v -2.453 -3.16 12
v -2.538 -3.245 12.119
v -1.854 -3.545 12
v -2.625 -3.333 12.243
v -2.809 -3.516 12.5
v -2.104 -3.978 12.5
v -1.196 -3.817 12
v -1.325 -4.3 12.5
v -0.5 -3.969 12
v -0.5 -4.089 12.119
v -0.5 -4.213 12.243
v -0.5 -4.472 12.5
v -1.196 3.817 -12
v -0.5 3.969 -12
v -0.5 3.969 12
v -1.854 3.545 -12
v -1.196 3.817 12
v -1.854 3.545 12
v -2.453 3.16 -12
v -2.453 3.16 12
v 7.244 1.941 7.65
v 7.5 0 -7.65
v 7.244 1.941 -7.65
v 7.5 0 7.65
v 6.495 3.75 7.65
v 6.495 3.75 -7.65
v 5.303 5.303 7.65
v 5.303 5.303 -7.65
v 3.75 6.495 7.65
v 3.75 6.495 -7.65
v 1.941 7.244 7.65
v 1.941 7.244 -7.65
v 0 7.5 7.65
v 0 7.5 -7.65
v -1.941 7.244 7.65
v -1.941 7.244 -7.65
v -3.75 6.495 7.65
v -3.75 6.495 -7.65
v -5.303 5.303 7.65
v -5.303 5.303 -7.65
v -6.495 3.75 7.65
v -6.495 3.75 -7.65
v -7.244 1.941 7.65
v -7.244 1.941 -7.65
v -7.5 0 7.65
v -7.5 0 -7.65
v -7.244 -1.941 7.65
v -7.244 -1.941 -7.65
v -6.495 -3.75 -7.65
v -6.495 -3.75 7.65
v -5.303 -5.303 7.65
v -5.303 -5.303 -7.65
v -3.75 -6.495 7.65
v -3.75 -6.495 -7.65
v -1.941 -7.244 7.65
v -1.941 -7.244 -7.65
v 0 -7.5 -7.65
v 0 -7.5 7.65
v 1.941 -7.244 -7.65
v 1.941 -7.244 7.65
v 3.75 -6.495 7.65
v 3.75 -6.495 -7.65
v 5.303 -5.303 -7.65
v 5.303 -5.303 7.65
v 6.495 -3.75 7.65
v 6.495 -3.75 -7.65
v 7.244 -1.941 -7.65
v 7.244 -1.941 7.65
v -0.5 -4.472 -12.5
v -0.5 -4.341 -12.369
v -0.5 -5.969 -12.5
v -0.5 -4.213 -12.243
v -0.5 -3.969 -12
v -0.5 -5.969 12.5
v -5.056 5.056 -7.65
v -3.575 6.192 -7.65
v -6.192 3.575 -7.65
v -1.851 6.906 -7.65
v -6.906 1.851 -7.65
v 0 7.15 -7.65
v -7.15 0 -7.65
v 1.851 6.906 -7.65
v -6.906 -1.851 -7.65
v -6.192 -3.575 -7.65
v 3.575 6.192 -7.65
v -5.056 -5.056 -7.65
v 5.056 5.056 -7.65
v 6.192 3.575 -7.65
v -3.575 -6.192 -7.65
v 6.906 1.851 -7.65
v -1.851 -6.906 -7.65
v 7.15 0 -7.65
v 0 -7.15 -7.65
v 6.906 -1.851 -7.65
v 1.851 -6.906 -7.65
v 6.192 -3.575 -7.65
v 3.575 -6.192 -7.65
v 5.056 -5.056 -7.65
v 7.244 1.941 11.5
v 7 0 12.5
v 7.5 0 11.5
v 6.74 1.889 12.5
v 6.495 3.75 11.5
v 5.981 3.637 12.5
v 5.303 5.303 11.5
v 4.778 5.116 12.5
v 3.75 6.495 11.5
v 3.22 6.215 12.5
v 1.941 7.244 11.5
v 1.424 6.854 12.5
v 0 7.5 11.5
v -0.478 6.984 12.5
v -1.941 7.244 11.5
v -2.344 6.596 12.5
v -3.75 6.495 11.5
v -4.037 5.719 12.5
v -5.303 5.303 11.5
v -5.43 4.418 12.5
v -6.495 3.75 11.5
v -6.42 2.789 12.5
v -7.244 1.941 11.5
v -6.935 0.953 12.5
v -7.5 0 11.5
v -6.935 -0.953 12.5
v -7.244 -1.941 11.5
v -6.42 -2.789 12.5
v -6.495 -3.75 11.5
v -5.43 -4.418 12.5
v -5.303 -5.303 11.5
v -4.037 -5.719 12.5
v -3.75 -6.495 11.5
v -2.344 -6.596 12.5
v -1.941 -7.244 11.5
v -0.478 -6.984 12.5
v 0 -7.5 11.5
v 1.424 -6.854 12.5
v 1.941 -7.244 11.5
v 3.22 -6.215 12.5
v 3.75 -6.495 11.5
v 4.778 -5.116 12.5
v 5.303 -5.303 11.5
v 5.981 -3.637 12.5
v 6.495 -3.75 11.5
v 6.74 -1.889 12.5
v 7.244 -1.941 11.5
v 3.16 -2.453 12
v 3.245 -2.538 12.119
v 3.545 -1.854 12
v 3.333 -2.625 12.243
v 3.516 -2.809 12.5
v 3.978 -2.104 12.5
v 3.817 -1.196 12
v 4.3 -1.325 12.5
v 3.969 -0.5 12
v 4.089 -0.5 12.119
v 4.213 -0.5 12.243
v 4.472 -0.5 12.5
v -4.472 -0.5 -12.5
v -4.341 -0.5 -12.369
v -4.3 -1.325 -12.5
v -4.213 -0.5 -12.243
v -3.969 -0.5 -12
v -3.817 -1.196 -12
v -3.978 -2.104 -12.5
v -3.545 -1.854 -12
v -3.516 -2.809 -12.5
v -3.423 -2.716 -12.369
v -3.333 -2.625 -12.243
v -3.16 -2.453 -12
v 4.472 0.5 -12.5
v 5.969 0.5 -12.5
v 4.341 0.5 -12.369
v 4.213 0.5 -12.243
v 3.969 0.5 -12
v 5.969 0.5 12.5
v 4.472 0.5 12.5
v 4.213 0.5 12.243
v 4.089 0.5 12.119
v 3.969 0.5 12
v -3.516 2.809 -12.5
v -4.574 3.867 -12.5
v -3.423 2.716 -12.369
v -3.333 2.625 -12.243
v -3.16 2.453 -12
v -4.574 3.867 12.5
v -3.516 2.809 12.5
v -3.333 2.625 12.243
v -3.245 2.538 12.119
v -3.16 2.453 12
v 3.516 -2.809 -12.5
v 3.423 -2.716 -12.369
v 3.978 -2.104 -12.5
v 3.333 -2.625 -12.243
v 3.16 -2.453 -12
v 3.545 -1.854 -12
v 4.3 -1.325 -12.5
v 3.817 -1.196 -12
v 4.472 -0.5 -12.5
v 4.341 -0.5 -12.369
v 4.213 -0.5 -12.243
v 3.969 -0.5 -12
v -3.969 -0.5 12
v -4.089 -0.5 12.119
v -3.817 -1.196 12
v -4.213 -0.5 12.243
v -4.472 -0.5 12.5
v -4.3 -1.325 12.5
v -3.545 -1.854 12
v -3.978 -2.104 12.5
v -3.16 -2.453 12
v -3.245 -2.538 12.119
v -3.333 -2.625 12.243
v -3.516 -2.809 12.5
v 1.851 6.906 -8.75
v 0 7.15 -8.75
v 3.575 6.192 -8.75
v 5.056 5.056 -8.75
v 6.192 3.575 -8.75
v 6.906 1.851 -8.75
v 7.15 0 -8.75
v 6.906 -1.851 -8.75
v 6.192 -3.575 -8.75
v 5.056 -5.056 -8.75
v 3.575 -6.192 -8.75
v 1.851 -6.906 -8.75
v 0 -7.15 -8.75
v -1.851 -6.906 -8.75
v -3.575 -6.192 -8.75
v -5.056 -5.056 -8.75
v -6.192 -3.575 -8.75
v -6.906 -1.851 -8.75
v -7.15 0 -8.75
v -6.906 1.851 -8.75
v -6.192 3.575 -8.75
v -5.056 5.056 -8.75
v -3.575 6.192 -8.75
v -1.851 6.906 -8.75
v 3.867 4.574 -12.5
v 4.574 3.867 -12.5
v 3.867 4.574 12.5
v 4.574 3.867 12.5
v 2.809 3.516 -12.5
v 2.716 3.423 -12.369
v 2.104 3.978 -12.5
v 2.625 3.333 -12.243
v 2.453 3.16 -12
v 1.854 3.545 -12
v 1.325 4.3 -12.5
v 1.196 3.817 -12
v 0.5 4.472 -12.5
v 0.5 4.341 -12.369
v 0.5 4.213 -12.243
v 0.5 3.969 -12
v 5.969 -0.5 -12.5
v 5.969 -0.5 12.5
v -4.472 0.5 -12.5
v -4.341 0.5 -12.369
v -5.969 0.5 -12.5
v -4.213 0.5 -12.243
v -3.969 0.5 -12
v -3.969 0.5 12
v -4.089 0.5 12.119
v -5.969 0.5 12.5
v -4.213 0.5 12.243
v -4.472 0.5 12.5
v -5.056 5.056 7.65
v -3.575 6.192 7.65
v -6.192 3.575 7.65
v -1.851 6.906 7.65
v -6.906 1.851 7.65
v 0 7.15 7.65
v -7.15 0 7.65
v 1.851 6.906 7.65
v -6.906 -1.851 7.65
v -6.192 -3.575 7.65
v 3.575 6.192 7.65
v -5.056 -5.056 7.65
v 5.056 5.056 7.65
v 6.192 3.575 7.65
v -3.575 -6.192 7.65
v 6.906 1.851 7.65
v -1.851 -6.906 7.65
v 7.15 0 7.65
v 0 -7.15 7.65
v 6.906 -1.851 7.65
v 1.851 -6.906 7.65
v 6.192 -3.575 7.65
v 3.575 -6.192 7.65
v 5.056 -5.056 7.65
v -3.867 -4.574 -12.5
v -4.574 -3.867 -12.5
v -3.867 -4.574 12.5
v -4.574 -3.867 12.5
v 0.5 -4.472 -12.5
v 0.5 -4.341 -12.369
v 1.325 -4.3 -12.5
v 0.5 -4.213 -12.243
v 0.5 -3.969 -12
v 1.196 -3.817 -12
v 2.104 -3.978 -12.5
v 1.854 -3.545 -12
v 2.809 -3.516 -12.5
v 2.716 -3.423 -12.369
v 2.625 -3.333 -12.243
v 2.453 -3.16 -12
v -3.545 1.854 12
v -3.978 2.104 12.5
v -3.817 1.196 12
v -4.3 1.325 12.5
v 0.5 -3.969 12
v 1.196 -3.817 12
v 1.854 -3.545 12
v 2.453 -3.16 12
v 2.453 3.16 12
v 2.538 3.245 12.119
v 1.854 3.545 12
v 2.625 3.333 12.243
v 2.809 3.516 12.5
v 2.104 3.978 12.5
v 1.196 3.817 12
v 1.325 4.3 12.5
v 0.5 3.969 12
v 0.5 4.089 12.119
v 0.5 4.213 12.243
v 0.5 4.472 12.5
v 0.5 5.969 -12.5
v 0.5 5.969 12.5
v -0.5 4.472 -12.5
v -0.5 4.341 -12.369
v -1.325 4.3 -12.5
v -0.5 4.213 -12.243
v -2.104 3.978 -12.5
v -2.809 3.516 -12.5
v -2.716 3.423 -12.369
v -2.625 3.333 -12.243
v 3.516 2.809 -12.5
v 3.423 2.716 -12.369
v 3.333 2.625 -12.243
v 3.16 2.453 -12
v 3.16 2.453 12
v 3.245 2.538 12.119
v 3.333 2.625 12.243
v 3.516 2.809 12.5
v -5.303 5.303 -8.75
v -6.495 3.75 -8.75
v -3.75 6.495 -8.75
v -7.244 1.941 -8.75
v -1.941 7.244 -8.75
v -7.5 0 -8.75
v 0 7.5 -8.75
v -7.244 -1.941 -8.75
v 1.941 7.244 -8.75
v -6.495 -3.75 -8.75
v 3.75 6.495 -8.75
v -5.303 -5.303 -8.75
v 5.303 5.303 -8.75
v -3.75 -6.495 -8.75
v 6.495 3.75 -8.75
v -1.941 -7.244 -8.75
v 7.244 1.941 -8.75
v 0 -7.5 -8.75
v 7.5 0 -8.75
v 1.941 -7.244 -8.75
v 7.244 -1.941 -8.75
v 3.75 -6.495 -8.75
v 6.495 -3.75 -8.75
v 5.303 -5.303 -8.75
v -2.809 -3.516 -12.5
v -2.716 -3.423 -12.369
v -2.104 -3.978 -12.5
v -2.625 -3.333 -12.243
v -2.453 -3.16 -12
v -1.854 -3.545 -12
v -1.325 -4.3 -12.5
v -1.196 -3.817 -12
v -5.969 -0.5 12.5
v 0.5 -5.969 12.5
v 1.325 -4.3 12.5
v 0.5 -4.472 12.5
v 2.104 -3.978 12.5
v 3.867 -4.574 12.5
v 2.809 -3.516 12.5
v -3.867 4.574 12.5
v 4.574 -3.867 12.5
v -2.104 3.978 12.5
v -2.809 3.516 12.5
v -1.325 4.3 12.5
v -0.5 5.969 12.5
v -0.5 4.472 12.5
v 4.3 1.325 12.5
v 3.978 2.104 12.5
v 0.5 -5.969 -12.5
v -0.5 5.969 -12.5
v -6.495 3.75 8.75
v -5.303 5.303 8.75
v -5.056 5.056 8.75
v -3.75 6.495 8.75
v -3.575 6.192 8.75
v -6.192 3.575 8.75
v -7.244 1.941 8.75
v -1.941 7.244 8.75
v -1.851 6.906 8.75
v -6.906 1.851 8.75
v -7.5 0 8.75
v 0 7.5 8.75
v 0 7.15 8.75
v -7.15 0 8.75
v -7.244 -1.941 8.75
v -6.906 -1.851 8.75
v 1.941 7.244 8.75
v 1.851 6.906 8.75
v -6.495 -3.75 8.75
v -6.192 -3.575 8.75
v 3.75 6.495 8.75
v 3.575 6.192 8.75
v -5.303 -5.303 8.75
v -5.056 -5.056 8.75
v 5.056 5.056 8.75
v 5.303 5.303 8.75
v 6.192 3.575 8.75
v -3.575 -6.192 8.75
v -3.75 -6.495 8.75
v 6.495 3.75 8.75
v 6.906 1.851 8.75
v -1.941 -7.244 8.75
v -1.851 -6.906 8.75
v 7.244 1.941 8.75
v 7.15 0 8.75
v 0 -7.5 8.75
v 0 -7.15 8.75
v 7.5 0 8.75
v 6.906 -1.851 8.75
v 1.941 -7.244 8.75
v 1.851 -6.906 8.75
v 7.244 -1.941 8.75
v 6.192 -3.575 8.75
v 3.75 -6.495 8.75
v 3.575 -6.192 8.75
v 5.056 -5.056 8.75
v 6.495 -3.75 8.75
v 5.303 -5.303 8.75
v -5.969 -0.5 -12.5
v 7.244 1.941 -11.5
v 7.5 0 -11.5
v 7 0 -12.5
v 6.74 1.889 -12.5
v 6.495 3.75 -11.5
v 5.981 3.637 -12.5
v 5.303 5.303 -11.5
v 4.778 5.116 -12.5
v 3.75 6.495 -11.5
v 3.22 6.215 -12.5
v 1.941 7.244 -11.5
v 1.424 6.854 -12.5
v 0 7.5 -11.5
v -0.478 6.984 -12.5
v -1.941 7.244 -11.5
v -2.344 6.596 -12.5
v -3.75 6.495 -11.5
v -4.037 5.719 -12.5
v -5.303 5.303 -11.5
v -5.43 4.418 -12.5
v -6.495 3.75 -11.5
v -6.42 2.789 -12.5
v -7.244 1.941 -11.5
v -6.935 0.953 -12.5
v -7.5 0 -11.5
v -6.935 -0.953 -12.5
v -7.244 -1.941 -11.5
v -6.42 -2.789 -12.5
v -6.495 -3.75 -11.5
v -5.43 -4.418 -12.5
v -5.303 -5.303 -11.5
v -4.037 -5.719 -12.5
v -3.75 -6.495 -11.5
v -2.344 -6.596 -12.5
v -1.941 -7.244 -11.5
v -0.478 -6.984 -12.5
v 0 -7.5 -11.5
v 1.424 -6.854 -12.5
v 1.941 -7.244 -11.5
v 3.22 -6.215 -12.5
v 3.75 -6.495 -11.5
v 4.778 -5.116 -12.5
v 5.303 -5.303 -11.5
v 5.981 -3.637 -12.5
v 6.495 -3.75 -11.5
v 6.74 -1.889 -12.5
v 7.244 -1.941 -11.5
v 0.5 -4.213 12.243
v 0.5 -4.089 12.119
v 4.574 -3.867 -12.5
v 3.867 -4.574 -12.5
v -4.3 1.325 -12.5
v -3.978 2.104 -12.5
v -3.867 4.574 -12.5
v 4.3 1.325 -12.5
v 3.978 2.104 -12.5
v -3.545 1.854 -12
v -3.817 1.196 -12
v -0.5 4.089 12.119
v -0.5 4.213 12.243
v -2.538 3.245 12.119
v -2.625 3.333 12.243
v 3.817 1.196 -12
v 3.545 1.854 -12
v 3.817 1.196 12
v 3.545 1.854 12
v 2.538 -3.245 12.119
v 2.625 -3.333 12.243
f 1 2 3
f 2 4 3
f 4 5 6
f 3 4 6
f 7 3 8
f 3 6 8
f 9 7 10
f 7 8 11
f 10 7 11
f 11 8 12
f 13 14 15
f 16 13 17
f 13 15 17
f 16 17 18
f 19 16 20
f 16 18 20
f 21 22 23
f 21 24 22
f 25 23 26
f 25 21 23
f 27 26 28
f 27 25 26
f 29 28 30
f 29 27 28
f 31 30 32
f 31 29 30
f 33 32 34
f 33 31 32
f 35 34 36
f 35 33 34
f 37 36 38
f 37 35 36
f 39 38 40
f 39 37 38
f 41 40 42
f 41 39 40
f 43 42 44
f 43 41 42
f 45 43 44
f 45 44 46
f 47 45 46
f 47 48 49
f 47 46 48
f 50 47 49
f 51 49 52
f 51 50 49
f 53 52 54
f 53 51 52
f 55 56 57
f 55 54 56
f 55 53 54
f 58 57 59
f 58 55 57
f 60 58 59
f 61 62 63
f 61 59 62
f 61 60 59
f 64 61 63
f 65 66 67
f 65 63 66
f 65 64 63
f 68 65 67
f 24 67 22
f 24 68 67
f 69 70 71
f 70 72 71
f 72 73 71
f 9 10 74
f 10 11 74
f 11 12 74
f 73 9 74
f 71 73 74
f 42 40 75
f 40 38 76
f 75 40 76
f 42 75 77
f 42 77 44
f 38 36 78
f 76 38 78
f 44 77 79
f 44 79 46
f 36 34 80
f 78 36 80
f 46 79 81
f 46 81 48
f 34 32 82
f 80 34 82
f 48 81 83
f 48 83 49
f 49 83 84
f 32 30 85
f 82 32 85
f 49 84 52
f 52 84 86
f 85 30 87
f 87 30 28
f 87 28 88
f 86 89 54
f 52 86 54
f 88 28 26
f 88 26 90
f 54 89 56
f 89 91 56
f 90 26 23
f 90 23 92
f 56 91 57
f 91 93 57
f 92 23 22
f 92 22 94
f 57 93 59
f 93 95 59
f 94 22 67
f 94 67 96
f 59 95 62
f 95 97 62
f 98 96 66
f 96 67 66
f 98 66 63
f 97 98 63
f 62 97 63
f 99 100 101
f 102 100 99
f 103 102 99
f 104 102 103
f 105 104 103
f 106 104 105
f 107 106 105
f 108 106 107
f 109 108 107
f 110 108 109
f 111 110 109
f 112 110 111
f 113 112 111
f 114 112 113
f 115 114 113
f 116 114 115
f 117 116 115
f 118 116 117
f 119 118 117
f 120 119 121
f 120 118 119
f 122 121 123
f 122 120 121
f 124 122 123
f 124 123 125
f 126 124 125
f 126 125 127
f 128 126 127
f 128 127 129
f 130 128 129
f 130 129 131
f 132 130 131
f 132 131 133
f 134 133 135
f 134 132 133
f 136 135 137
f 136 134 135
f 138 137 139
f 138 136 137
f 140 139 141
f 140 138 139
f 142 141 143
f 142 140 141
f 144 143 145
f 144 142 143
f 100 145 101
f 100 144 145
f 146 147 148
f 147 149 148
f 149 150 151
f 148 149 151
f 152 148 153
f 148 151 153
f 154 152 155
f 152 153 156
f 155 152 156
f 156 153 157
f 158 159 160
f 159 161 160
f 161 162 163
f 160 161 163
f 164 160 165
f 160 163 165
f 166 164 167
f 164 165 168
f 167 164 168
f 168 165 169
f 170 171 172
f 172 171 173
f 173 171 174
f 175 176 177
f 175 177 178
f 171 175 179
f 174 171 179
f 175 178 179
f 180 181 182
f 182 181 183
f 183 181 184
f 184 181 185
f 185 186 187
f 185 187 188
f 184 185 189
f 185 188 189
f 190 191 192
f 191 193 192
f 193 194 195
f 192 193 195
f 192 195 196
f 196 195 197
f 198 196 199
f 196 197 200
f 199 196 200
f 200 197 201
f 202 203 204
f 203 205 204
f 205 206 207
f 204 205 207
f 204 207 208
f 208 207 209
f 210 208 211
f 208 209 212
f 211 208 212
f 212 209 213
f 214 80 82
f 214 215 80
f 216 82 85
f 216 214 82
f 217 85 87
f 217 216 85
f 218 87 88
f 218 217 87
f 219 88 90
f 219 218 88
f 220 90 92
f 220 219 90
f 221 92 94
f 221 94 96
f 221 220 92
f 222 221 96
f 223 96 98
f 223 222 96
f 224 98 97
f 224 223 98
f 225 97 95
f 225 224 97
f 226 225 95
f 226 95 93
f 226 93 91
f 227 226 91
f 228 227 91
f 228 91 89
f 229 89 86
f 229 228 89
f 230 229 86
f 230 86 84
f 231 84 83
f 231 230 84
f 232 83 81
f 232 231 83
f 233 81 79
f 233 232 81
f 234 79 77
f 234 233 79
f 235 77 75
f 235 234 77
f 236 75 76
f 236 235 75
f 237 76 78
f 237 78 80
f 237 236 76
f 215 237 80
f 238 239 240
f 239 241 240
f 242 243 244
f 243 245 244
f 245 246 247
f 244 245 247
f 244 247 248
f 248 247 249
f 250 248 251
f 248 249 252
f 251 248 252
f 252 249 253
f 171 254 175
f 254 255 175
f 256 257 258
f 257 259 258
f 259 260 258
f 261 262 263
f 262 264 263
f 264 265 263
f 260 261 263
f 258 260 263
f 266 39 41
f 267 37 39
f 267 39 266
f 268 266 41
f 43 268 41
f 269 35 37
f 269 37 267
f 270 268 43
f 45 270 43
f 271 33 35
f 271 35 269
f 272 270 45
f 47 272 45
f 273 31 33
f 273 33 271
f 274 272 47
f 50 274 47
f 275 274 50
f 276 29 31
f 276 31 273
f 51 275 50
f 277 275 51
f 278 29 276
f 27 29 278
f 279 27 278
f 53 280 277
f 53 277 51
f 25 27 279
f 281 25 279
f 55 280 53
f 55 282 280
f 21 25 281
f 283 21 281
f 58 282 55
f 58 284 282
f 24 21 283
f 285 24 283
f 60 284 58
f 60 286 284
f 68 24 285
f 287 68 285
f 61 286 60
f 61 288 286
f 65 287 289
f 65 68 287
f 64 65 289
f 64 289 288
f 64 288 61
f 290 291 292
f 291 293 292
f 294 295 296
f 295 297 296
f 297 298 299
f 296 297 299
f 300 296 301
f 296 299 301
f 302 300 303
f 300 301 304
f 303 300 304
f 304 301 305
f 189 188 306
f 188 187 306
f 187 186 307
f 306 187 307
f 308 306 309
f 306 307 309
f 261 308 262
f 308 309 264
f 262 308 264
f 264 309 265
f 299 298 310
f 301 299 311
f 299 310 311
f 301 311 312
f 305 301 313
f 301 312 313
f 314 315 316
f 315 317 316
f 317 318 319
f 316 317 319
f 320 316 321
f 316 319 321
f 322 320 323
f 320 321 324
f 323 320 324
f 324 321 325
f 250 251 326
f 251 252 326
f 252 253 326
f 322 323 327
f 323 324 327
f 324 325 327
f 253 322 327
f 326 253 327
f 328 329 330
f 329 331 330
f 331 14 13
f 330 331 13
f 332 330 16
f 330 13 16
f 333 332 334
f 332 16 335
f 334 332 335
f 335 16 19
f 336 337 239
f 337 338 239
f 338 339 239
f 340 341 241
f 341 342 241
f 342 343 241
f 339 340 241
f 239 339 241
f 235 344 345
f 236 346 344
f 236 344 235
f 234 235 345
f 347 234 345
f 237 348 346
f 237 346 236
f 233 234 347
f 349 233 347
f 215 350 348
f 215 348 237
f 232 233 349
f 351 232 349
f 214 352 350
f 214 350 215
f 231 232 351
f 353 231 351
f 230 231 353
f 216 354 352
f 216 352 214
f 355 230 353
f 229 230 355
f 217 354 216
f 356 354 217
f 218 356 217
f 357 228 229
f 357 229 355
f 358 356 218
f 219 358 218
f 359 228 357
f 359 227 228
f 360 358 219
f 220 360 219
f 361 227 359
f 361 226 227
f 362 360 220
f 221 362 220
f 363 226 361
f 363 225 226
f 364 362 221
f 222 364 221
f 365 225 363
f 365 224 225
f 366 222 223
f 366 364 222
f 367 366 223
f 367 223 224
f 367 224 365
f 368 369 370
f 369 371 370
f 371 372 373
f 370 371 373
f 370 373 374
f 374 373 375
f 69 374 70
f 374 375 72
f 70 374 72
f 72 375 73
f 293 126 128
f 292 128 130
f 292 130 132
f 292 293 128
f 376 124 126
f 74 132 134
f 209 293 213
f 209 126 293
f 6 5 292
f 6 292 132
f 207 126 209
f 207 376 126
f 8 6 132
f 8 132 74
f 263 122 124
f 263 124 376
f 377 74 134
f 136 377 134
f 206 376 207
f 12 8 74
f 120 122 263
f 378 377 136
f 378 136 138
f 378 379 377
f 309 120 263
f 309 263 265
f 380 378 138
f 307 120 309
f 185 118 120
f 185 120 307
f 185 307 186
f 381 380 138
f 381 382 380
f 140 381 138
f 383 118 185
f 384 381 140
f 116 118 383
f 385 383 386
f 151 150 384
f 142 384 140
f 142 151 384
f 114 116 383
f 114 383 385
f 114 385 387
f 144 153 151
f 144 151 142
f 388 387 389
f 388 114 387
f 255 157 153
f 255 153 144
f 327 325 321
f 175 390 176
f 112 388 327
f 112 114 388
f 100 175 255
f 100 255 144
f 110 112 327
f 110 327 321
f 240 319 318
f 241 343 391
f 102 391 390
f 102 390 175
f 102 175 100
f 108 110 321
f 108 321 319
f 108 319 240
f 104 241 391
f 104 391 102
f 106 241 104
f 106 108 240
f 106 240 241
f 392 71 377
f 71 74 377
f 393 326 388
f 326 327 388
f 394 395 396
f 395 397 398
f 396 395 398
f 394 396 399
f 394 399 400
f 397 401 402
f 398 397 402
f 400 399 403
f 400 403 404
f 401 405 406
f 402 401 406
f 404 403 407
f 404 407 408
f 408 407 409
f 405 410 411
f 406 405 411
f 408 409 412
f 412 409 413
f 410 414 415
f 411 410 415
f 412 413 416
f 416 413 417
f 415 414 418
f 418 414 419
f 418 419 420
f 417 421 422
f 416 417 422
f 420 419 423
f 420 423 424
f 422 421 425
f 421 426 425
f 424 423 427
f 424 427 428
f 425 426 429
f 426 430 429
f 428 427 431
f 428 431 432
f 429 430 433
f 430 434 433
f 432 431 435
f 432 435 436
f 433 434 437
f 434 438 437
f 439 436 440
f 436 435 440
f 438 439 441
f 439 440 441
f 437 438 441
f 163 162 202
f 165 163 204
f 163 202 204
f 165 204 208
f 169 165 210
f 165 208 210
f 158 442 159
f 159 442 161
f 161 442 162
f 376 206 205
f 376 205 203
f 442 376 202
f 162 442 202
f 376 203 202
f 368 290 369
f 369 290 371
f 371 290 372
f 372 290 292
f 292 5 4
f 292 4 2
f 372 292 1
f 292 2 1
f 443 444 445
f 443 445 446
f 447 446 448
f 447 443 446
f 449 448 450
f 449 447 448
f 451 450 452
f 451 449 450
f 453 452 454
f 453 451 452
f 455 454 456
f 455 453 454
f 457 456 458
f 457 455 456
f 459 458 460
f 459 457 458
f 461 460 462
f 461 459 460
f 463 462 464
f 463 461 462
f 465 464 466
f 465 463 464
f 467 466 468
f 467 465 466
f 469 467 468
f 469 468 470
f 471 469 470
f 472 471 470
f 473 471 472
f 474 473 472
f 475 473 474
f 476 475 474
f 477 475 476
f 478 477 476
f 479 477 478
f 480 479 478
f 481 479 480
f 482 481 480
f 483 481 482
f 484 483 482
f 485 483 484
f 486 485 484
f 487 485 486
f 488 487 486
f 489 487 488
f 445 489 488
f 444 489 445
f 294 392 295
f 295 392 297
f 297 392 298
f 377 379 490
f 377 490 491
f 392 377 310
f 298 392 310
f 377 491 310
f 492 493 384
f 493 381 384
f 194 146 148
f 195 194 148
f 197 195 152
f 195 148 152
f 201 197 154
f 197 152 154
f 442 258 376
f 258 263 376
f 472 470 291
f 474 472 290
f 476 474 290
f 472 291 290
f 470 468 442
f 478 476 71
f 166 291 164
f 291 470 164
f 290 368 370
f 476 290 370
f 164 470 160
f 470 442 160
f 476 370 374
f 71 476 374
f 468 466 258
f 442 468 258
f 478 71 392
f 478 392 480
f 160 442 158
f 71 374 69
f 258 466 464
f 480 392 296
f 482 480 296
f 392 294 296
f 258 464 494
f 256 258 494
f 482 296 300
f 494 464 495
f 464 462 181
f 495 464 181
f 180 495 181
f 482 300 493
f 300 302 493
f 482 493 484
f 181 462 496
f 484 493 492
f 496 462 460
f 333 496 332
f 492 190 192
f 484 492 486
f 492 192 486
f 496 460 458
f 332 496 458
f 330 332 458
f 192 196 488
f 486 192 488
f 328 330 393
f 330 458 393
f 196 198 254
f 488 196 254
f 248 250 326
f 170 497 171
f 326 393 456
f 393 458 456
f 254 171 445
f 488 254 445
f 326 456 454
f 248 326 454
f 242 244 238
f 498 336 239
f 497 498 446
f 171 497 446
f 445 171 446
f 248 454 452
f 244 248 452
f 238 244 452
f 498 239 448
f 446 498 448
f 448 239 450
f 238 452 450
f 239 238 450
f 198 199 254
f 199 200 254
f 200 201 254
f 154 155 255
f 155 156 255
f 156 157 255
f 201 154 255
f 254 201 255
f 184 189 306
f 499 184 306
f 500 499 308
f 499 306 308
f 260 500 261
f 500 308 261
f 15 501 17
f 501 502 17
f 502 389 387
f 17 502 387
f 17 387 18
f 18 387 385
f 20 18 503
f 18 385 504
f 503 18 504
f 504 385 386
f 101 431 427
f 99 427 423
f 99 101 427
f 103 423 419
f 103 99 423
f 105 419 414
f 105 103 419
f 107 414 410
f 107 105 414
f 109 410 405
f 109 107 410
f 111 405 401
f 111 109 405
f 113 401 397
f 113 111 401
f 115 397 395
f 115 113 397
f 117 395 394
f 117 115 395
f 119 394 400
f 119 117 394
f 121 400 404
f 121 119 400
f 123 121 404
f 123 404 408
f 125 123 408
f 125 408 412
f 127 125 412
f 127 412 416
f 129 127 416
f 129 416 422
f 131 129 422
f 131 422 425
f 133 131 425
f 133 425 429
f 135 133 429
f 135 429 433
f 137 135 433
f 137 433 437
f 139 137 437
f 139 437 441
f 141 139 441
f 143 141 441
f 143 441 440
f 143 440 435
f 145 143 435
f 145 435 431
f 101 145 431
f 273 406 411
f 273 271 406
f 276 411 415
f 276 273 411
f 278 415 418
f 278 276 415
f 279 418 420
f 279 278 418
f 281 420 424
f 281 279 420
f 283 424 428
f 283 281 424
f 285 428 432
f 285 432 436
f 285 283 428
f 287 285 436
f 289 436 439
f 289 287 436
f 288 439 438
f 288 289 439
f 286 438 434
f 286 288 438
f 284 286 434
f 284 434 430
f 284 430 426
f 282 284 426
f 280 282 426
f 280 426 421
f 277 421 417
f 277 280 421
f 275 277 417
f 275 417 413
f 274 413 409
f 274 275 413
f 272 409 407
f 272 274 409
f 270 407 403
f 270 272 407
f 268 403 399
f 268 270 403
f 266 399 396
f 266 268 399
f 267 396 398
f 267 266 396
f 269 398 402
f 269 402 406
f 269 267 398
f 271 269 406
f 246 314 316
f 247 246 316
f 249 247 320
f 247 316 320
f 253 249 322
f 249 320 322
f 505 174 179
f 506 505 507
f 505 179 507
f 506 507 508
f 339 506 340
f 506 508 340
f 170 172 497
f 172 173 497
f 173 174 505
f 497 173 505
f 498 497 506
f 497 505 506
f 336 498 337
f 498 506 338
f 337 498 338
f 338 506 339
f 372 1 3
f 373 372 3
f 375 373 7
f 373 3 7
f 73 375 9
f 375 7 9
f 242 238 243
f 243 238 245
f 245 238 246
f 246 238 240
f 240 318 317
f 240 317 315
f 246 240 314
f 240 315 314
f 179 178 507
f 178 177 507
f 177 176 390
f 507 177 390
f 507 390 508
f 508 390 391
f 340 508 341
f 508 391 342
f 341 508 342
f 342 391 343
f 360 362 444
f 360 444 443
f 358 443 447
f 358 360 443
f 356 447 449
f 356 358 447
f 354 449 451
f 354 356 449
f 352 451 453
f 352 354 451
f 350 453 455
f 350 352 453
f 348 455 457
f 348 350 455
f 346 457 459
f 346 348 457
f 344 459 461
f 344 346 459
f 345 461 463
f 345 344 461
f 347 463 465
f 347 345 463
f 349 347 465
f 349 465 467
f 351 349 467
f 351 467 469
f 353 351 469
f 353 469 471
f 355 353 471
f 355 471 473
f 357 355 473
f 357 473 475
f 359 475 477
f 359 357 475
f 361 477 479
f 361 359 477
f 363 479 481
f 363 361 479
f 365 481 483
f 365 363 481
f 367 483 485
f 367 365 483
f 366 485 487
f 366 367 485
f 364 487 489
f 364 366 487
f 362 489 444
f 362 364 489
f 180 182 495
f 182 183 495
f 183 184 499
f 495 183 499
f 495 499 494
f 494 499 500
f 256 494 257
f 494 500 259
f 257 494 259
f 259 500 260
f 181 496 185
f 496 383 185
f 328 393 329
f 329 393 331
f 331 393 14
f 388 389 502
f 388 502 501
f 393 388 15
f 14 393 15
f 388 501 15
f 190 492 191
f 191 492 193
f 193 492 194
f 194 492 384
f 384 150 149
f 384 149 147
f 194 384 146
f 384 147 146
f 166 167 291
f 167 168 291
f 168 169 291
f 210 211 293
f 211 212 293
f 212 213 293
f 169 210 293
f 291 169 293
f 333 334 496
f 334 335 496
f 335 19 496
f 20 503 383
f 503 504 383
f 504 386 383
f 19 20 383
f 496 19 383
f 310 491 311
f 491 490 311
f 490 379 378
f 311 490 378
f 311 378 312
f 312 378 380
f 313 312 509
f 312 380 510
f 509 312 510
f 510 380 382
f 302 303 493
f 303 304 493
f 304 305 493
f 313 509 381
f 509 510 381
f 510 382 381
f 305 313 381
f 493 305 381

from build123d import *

# Parameters (mm, degrees)
ESQUISSE1_R        = 7.5
BOSS_EXTRU_1_DEPTH = 12.5
ESQUISSE2_W        = 1.1
ESQUISSE2_H        = 0.35
CHANFREIN1_SIZE    = 1
CHANFREIN1_SIZE2   = 0.5
CHANFREIN2_SIZE    = 0.5
CHANFREIN2_SIZE2   = 1
CHANFREIN3_SIZE    = 0.5


with BuildPart() as part:
    # Esquisse1 → Boss.-Extru.1 (new body, symmetric)
    with BuildSketch(Plane.XY):
        Circle(ESQUISSE1_R)
        with BuildLine():
            Line((3.866903212, 4.574009993), (2.452689649, 3.159796431))
            ThreePointArc((2.452689649, 3.159796431), (1.530733729, 3.69551813), (0.5, 3.968626967))
            Line((0.5, 3.968626967), (0.5, 5.968626967))
            Line((0.5, 5.968626967), (-0.5, 5.968626967))
            Line((-0.5, 5.968626967), (-0.5, 3.968626967))
            ThreePointArc((-0.5, 3.968626967), (-1.530733729, 3.69551813), (-2.452689649, 3.159796431))
            Line((-2.452689649, 3.159796431), (-3.866903212, 4.574009993))
            Line((-3.866903212, 4.574009993), (-4.574009993, 3.866903212))
            Line((-4.574009993, 3.866903212), (-3.159796431, 2.452689649))
            ThreePointArc((-3.159796431, 2.452689649), (-3.69551813, 1.530733729), (-3.968626967, 0.5))
            Line((-3.968626967, 0.5), (-5.968626967, 0.5))
            Line((-5.968626967, 0.5), (-5.968626967, -0.5))
            Line((-5.968626967, -0.5), (-3.968626967, -0.5))
            ThreePointArc((-3.968626967, -0.5), (-3.69551813, -1.530733729), (-3.159796431, -2.452689649))
            Line((-3.159796431, -2.452689649), (-4.574009993, -3.866903212))
            Line((-4.574009993, -3.866903212), (-3.866903212, -4.574009993))
            Line((-3.866903212, -4.574009993), (-2.452689649, -3.159796431))
            ThreePointArc((-2.452689649, -3.159796431), (-1.530733729, -3.69551813), (-0.5, -3.968626967))
            Line((-0.5, -3.968626967), (-0.5, -5.968626967))
            Line((-0.5, -5.968626967), (0.5, -5.968626967))
            Line((0.5, -5.968626967), (0.5, -3.968626967))
            ThreePointArc((0.5, -3.968626967), (1.530733729, -3.69551813), (2.452689649, -3.159796431))
            Line((2.452689649, -3.159796431), (3.866903212, -4.574009993))
            Line((3.866903212, -4.574009993), (4.574009993, -3.866903212))
            Line((4.574009993, -3.866903212), (3.159796431, -2.452689649))
            ThreePointArc((3.159796431, -2.452689649), (3.69551813, -1.530733729), (3.968626967, -0.5))
            Line((3.968626967, -0.5), (5.968626967, -0.5))
            Line((5.968626967, -0.5), (5.968626967, 0.5))
            Line((5.968626967, 0.5), (3.968626967, 0.5))
            ThreePointArc((3.968626967, 0.5), (3.69551813, 1.530733729), (3.159796431, 2.452689649))
            Line((3.159796431, 2.452689649), (4.574009993, 3.866903212))
            Line((4.574009993, 3.866903212), (3.866903212, 4.574009993))
        make_face(mode=Mode.SUBTRACT)
    extrude(amount=BOSS_EXTRU_1_DEPTH, both=True)

    # Esquisse2 → Enlèvement de matière-Révolution1 (revolve, cut)
    with BuildSketch(Plane(origin=(0, 0, 0), x_dir=(0, 0, -1), z_dir=(1, 0, 0))):
        with Locations((-8.2, 7.325)):
            Rectangle(ESQUISSE2_W, ESQUISSE2_H)
        with Locations((8.2, 7.325)):
            Rectangle(ESQUISSE2_W, ESQUISSE2_H)
    revolve(axis=Axis((0, 0, 12.5), (0, 0, -1)), mode=Mode.SUBTRACT)

    # Chanfrein1
    chanfrein1_edges = [part.edges().sort_by_distance(p)[0] for p in [
        (-7.5, 0, 12.5),
    ]]
    chanfrein1_side = [part.faces().sort_by_distance(p)[0] for p in [
        (-7.5, 0, 10.625),
    ]]
    chamfer(chanfrein1_edges, length=CHANFREIN1_SIZE, length2=CHANFREIN1_SIZE2, reference=chanfrein1_side[0])

    # Chanfrein2
    chanfrein2_edges = [part.edges().sort_by_distance(p)[0] for p in [
        (-7.5, 0, -12.5),
    ]]
    chanfrein2_side = [part.faces().sort_by_distance(p)[0] for p in [
        (-7.287867966, 0, -12.5),
    ]]
    chamfer(chanfrein2_edges, length=CHANFREIN2_SIZE, length2=CHANFREIN2_SIZE2, reference=chanfrein2_side[0])

    # Chanfrein3
    chanfrein3_edges = [part.edges().sort_by_distance(p)[0] for p in [
        (-1.530733729, 3.69551813, -12.5),
        (-3.69551813, 1.530733729, -12.5),
        (-3.69551813, -1.530733729, -12.5),
        (-1.530733729, -3.69551813, -12.5),
        (1.530733729, -3.69551813, -12.5),
        (3.69551813, -1.530733729, -12.5),
        (3.69551813, 1.530733729, -12.5),
        (1.530733729, 3.69551813, -12.5),
        (-1.530733729, 3.69551813, 12.5),
        (-3.69551813, 1.530733729, 12.5),
        (-3.69551813, -1.530733729, 12.5),
        (-1.530733729, -3.69551813, 12.5),
        (1.530733729, -3.69551813, 12.5),
        (3.69551813, -1.530733729, 12.5),
        (3.69551813, 1.530733729, 12.5),
        (1.530733729, 3.69551813, 12.5),
    ]]
    chamfer(chanfrein3_edges, length=CHANFREIN3_SIZE)


solid = part.part
